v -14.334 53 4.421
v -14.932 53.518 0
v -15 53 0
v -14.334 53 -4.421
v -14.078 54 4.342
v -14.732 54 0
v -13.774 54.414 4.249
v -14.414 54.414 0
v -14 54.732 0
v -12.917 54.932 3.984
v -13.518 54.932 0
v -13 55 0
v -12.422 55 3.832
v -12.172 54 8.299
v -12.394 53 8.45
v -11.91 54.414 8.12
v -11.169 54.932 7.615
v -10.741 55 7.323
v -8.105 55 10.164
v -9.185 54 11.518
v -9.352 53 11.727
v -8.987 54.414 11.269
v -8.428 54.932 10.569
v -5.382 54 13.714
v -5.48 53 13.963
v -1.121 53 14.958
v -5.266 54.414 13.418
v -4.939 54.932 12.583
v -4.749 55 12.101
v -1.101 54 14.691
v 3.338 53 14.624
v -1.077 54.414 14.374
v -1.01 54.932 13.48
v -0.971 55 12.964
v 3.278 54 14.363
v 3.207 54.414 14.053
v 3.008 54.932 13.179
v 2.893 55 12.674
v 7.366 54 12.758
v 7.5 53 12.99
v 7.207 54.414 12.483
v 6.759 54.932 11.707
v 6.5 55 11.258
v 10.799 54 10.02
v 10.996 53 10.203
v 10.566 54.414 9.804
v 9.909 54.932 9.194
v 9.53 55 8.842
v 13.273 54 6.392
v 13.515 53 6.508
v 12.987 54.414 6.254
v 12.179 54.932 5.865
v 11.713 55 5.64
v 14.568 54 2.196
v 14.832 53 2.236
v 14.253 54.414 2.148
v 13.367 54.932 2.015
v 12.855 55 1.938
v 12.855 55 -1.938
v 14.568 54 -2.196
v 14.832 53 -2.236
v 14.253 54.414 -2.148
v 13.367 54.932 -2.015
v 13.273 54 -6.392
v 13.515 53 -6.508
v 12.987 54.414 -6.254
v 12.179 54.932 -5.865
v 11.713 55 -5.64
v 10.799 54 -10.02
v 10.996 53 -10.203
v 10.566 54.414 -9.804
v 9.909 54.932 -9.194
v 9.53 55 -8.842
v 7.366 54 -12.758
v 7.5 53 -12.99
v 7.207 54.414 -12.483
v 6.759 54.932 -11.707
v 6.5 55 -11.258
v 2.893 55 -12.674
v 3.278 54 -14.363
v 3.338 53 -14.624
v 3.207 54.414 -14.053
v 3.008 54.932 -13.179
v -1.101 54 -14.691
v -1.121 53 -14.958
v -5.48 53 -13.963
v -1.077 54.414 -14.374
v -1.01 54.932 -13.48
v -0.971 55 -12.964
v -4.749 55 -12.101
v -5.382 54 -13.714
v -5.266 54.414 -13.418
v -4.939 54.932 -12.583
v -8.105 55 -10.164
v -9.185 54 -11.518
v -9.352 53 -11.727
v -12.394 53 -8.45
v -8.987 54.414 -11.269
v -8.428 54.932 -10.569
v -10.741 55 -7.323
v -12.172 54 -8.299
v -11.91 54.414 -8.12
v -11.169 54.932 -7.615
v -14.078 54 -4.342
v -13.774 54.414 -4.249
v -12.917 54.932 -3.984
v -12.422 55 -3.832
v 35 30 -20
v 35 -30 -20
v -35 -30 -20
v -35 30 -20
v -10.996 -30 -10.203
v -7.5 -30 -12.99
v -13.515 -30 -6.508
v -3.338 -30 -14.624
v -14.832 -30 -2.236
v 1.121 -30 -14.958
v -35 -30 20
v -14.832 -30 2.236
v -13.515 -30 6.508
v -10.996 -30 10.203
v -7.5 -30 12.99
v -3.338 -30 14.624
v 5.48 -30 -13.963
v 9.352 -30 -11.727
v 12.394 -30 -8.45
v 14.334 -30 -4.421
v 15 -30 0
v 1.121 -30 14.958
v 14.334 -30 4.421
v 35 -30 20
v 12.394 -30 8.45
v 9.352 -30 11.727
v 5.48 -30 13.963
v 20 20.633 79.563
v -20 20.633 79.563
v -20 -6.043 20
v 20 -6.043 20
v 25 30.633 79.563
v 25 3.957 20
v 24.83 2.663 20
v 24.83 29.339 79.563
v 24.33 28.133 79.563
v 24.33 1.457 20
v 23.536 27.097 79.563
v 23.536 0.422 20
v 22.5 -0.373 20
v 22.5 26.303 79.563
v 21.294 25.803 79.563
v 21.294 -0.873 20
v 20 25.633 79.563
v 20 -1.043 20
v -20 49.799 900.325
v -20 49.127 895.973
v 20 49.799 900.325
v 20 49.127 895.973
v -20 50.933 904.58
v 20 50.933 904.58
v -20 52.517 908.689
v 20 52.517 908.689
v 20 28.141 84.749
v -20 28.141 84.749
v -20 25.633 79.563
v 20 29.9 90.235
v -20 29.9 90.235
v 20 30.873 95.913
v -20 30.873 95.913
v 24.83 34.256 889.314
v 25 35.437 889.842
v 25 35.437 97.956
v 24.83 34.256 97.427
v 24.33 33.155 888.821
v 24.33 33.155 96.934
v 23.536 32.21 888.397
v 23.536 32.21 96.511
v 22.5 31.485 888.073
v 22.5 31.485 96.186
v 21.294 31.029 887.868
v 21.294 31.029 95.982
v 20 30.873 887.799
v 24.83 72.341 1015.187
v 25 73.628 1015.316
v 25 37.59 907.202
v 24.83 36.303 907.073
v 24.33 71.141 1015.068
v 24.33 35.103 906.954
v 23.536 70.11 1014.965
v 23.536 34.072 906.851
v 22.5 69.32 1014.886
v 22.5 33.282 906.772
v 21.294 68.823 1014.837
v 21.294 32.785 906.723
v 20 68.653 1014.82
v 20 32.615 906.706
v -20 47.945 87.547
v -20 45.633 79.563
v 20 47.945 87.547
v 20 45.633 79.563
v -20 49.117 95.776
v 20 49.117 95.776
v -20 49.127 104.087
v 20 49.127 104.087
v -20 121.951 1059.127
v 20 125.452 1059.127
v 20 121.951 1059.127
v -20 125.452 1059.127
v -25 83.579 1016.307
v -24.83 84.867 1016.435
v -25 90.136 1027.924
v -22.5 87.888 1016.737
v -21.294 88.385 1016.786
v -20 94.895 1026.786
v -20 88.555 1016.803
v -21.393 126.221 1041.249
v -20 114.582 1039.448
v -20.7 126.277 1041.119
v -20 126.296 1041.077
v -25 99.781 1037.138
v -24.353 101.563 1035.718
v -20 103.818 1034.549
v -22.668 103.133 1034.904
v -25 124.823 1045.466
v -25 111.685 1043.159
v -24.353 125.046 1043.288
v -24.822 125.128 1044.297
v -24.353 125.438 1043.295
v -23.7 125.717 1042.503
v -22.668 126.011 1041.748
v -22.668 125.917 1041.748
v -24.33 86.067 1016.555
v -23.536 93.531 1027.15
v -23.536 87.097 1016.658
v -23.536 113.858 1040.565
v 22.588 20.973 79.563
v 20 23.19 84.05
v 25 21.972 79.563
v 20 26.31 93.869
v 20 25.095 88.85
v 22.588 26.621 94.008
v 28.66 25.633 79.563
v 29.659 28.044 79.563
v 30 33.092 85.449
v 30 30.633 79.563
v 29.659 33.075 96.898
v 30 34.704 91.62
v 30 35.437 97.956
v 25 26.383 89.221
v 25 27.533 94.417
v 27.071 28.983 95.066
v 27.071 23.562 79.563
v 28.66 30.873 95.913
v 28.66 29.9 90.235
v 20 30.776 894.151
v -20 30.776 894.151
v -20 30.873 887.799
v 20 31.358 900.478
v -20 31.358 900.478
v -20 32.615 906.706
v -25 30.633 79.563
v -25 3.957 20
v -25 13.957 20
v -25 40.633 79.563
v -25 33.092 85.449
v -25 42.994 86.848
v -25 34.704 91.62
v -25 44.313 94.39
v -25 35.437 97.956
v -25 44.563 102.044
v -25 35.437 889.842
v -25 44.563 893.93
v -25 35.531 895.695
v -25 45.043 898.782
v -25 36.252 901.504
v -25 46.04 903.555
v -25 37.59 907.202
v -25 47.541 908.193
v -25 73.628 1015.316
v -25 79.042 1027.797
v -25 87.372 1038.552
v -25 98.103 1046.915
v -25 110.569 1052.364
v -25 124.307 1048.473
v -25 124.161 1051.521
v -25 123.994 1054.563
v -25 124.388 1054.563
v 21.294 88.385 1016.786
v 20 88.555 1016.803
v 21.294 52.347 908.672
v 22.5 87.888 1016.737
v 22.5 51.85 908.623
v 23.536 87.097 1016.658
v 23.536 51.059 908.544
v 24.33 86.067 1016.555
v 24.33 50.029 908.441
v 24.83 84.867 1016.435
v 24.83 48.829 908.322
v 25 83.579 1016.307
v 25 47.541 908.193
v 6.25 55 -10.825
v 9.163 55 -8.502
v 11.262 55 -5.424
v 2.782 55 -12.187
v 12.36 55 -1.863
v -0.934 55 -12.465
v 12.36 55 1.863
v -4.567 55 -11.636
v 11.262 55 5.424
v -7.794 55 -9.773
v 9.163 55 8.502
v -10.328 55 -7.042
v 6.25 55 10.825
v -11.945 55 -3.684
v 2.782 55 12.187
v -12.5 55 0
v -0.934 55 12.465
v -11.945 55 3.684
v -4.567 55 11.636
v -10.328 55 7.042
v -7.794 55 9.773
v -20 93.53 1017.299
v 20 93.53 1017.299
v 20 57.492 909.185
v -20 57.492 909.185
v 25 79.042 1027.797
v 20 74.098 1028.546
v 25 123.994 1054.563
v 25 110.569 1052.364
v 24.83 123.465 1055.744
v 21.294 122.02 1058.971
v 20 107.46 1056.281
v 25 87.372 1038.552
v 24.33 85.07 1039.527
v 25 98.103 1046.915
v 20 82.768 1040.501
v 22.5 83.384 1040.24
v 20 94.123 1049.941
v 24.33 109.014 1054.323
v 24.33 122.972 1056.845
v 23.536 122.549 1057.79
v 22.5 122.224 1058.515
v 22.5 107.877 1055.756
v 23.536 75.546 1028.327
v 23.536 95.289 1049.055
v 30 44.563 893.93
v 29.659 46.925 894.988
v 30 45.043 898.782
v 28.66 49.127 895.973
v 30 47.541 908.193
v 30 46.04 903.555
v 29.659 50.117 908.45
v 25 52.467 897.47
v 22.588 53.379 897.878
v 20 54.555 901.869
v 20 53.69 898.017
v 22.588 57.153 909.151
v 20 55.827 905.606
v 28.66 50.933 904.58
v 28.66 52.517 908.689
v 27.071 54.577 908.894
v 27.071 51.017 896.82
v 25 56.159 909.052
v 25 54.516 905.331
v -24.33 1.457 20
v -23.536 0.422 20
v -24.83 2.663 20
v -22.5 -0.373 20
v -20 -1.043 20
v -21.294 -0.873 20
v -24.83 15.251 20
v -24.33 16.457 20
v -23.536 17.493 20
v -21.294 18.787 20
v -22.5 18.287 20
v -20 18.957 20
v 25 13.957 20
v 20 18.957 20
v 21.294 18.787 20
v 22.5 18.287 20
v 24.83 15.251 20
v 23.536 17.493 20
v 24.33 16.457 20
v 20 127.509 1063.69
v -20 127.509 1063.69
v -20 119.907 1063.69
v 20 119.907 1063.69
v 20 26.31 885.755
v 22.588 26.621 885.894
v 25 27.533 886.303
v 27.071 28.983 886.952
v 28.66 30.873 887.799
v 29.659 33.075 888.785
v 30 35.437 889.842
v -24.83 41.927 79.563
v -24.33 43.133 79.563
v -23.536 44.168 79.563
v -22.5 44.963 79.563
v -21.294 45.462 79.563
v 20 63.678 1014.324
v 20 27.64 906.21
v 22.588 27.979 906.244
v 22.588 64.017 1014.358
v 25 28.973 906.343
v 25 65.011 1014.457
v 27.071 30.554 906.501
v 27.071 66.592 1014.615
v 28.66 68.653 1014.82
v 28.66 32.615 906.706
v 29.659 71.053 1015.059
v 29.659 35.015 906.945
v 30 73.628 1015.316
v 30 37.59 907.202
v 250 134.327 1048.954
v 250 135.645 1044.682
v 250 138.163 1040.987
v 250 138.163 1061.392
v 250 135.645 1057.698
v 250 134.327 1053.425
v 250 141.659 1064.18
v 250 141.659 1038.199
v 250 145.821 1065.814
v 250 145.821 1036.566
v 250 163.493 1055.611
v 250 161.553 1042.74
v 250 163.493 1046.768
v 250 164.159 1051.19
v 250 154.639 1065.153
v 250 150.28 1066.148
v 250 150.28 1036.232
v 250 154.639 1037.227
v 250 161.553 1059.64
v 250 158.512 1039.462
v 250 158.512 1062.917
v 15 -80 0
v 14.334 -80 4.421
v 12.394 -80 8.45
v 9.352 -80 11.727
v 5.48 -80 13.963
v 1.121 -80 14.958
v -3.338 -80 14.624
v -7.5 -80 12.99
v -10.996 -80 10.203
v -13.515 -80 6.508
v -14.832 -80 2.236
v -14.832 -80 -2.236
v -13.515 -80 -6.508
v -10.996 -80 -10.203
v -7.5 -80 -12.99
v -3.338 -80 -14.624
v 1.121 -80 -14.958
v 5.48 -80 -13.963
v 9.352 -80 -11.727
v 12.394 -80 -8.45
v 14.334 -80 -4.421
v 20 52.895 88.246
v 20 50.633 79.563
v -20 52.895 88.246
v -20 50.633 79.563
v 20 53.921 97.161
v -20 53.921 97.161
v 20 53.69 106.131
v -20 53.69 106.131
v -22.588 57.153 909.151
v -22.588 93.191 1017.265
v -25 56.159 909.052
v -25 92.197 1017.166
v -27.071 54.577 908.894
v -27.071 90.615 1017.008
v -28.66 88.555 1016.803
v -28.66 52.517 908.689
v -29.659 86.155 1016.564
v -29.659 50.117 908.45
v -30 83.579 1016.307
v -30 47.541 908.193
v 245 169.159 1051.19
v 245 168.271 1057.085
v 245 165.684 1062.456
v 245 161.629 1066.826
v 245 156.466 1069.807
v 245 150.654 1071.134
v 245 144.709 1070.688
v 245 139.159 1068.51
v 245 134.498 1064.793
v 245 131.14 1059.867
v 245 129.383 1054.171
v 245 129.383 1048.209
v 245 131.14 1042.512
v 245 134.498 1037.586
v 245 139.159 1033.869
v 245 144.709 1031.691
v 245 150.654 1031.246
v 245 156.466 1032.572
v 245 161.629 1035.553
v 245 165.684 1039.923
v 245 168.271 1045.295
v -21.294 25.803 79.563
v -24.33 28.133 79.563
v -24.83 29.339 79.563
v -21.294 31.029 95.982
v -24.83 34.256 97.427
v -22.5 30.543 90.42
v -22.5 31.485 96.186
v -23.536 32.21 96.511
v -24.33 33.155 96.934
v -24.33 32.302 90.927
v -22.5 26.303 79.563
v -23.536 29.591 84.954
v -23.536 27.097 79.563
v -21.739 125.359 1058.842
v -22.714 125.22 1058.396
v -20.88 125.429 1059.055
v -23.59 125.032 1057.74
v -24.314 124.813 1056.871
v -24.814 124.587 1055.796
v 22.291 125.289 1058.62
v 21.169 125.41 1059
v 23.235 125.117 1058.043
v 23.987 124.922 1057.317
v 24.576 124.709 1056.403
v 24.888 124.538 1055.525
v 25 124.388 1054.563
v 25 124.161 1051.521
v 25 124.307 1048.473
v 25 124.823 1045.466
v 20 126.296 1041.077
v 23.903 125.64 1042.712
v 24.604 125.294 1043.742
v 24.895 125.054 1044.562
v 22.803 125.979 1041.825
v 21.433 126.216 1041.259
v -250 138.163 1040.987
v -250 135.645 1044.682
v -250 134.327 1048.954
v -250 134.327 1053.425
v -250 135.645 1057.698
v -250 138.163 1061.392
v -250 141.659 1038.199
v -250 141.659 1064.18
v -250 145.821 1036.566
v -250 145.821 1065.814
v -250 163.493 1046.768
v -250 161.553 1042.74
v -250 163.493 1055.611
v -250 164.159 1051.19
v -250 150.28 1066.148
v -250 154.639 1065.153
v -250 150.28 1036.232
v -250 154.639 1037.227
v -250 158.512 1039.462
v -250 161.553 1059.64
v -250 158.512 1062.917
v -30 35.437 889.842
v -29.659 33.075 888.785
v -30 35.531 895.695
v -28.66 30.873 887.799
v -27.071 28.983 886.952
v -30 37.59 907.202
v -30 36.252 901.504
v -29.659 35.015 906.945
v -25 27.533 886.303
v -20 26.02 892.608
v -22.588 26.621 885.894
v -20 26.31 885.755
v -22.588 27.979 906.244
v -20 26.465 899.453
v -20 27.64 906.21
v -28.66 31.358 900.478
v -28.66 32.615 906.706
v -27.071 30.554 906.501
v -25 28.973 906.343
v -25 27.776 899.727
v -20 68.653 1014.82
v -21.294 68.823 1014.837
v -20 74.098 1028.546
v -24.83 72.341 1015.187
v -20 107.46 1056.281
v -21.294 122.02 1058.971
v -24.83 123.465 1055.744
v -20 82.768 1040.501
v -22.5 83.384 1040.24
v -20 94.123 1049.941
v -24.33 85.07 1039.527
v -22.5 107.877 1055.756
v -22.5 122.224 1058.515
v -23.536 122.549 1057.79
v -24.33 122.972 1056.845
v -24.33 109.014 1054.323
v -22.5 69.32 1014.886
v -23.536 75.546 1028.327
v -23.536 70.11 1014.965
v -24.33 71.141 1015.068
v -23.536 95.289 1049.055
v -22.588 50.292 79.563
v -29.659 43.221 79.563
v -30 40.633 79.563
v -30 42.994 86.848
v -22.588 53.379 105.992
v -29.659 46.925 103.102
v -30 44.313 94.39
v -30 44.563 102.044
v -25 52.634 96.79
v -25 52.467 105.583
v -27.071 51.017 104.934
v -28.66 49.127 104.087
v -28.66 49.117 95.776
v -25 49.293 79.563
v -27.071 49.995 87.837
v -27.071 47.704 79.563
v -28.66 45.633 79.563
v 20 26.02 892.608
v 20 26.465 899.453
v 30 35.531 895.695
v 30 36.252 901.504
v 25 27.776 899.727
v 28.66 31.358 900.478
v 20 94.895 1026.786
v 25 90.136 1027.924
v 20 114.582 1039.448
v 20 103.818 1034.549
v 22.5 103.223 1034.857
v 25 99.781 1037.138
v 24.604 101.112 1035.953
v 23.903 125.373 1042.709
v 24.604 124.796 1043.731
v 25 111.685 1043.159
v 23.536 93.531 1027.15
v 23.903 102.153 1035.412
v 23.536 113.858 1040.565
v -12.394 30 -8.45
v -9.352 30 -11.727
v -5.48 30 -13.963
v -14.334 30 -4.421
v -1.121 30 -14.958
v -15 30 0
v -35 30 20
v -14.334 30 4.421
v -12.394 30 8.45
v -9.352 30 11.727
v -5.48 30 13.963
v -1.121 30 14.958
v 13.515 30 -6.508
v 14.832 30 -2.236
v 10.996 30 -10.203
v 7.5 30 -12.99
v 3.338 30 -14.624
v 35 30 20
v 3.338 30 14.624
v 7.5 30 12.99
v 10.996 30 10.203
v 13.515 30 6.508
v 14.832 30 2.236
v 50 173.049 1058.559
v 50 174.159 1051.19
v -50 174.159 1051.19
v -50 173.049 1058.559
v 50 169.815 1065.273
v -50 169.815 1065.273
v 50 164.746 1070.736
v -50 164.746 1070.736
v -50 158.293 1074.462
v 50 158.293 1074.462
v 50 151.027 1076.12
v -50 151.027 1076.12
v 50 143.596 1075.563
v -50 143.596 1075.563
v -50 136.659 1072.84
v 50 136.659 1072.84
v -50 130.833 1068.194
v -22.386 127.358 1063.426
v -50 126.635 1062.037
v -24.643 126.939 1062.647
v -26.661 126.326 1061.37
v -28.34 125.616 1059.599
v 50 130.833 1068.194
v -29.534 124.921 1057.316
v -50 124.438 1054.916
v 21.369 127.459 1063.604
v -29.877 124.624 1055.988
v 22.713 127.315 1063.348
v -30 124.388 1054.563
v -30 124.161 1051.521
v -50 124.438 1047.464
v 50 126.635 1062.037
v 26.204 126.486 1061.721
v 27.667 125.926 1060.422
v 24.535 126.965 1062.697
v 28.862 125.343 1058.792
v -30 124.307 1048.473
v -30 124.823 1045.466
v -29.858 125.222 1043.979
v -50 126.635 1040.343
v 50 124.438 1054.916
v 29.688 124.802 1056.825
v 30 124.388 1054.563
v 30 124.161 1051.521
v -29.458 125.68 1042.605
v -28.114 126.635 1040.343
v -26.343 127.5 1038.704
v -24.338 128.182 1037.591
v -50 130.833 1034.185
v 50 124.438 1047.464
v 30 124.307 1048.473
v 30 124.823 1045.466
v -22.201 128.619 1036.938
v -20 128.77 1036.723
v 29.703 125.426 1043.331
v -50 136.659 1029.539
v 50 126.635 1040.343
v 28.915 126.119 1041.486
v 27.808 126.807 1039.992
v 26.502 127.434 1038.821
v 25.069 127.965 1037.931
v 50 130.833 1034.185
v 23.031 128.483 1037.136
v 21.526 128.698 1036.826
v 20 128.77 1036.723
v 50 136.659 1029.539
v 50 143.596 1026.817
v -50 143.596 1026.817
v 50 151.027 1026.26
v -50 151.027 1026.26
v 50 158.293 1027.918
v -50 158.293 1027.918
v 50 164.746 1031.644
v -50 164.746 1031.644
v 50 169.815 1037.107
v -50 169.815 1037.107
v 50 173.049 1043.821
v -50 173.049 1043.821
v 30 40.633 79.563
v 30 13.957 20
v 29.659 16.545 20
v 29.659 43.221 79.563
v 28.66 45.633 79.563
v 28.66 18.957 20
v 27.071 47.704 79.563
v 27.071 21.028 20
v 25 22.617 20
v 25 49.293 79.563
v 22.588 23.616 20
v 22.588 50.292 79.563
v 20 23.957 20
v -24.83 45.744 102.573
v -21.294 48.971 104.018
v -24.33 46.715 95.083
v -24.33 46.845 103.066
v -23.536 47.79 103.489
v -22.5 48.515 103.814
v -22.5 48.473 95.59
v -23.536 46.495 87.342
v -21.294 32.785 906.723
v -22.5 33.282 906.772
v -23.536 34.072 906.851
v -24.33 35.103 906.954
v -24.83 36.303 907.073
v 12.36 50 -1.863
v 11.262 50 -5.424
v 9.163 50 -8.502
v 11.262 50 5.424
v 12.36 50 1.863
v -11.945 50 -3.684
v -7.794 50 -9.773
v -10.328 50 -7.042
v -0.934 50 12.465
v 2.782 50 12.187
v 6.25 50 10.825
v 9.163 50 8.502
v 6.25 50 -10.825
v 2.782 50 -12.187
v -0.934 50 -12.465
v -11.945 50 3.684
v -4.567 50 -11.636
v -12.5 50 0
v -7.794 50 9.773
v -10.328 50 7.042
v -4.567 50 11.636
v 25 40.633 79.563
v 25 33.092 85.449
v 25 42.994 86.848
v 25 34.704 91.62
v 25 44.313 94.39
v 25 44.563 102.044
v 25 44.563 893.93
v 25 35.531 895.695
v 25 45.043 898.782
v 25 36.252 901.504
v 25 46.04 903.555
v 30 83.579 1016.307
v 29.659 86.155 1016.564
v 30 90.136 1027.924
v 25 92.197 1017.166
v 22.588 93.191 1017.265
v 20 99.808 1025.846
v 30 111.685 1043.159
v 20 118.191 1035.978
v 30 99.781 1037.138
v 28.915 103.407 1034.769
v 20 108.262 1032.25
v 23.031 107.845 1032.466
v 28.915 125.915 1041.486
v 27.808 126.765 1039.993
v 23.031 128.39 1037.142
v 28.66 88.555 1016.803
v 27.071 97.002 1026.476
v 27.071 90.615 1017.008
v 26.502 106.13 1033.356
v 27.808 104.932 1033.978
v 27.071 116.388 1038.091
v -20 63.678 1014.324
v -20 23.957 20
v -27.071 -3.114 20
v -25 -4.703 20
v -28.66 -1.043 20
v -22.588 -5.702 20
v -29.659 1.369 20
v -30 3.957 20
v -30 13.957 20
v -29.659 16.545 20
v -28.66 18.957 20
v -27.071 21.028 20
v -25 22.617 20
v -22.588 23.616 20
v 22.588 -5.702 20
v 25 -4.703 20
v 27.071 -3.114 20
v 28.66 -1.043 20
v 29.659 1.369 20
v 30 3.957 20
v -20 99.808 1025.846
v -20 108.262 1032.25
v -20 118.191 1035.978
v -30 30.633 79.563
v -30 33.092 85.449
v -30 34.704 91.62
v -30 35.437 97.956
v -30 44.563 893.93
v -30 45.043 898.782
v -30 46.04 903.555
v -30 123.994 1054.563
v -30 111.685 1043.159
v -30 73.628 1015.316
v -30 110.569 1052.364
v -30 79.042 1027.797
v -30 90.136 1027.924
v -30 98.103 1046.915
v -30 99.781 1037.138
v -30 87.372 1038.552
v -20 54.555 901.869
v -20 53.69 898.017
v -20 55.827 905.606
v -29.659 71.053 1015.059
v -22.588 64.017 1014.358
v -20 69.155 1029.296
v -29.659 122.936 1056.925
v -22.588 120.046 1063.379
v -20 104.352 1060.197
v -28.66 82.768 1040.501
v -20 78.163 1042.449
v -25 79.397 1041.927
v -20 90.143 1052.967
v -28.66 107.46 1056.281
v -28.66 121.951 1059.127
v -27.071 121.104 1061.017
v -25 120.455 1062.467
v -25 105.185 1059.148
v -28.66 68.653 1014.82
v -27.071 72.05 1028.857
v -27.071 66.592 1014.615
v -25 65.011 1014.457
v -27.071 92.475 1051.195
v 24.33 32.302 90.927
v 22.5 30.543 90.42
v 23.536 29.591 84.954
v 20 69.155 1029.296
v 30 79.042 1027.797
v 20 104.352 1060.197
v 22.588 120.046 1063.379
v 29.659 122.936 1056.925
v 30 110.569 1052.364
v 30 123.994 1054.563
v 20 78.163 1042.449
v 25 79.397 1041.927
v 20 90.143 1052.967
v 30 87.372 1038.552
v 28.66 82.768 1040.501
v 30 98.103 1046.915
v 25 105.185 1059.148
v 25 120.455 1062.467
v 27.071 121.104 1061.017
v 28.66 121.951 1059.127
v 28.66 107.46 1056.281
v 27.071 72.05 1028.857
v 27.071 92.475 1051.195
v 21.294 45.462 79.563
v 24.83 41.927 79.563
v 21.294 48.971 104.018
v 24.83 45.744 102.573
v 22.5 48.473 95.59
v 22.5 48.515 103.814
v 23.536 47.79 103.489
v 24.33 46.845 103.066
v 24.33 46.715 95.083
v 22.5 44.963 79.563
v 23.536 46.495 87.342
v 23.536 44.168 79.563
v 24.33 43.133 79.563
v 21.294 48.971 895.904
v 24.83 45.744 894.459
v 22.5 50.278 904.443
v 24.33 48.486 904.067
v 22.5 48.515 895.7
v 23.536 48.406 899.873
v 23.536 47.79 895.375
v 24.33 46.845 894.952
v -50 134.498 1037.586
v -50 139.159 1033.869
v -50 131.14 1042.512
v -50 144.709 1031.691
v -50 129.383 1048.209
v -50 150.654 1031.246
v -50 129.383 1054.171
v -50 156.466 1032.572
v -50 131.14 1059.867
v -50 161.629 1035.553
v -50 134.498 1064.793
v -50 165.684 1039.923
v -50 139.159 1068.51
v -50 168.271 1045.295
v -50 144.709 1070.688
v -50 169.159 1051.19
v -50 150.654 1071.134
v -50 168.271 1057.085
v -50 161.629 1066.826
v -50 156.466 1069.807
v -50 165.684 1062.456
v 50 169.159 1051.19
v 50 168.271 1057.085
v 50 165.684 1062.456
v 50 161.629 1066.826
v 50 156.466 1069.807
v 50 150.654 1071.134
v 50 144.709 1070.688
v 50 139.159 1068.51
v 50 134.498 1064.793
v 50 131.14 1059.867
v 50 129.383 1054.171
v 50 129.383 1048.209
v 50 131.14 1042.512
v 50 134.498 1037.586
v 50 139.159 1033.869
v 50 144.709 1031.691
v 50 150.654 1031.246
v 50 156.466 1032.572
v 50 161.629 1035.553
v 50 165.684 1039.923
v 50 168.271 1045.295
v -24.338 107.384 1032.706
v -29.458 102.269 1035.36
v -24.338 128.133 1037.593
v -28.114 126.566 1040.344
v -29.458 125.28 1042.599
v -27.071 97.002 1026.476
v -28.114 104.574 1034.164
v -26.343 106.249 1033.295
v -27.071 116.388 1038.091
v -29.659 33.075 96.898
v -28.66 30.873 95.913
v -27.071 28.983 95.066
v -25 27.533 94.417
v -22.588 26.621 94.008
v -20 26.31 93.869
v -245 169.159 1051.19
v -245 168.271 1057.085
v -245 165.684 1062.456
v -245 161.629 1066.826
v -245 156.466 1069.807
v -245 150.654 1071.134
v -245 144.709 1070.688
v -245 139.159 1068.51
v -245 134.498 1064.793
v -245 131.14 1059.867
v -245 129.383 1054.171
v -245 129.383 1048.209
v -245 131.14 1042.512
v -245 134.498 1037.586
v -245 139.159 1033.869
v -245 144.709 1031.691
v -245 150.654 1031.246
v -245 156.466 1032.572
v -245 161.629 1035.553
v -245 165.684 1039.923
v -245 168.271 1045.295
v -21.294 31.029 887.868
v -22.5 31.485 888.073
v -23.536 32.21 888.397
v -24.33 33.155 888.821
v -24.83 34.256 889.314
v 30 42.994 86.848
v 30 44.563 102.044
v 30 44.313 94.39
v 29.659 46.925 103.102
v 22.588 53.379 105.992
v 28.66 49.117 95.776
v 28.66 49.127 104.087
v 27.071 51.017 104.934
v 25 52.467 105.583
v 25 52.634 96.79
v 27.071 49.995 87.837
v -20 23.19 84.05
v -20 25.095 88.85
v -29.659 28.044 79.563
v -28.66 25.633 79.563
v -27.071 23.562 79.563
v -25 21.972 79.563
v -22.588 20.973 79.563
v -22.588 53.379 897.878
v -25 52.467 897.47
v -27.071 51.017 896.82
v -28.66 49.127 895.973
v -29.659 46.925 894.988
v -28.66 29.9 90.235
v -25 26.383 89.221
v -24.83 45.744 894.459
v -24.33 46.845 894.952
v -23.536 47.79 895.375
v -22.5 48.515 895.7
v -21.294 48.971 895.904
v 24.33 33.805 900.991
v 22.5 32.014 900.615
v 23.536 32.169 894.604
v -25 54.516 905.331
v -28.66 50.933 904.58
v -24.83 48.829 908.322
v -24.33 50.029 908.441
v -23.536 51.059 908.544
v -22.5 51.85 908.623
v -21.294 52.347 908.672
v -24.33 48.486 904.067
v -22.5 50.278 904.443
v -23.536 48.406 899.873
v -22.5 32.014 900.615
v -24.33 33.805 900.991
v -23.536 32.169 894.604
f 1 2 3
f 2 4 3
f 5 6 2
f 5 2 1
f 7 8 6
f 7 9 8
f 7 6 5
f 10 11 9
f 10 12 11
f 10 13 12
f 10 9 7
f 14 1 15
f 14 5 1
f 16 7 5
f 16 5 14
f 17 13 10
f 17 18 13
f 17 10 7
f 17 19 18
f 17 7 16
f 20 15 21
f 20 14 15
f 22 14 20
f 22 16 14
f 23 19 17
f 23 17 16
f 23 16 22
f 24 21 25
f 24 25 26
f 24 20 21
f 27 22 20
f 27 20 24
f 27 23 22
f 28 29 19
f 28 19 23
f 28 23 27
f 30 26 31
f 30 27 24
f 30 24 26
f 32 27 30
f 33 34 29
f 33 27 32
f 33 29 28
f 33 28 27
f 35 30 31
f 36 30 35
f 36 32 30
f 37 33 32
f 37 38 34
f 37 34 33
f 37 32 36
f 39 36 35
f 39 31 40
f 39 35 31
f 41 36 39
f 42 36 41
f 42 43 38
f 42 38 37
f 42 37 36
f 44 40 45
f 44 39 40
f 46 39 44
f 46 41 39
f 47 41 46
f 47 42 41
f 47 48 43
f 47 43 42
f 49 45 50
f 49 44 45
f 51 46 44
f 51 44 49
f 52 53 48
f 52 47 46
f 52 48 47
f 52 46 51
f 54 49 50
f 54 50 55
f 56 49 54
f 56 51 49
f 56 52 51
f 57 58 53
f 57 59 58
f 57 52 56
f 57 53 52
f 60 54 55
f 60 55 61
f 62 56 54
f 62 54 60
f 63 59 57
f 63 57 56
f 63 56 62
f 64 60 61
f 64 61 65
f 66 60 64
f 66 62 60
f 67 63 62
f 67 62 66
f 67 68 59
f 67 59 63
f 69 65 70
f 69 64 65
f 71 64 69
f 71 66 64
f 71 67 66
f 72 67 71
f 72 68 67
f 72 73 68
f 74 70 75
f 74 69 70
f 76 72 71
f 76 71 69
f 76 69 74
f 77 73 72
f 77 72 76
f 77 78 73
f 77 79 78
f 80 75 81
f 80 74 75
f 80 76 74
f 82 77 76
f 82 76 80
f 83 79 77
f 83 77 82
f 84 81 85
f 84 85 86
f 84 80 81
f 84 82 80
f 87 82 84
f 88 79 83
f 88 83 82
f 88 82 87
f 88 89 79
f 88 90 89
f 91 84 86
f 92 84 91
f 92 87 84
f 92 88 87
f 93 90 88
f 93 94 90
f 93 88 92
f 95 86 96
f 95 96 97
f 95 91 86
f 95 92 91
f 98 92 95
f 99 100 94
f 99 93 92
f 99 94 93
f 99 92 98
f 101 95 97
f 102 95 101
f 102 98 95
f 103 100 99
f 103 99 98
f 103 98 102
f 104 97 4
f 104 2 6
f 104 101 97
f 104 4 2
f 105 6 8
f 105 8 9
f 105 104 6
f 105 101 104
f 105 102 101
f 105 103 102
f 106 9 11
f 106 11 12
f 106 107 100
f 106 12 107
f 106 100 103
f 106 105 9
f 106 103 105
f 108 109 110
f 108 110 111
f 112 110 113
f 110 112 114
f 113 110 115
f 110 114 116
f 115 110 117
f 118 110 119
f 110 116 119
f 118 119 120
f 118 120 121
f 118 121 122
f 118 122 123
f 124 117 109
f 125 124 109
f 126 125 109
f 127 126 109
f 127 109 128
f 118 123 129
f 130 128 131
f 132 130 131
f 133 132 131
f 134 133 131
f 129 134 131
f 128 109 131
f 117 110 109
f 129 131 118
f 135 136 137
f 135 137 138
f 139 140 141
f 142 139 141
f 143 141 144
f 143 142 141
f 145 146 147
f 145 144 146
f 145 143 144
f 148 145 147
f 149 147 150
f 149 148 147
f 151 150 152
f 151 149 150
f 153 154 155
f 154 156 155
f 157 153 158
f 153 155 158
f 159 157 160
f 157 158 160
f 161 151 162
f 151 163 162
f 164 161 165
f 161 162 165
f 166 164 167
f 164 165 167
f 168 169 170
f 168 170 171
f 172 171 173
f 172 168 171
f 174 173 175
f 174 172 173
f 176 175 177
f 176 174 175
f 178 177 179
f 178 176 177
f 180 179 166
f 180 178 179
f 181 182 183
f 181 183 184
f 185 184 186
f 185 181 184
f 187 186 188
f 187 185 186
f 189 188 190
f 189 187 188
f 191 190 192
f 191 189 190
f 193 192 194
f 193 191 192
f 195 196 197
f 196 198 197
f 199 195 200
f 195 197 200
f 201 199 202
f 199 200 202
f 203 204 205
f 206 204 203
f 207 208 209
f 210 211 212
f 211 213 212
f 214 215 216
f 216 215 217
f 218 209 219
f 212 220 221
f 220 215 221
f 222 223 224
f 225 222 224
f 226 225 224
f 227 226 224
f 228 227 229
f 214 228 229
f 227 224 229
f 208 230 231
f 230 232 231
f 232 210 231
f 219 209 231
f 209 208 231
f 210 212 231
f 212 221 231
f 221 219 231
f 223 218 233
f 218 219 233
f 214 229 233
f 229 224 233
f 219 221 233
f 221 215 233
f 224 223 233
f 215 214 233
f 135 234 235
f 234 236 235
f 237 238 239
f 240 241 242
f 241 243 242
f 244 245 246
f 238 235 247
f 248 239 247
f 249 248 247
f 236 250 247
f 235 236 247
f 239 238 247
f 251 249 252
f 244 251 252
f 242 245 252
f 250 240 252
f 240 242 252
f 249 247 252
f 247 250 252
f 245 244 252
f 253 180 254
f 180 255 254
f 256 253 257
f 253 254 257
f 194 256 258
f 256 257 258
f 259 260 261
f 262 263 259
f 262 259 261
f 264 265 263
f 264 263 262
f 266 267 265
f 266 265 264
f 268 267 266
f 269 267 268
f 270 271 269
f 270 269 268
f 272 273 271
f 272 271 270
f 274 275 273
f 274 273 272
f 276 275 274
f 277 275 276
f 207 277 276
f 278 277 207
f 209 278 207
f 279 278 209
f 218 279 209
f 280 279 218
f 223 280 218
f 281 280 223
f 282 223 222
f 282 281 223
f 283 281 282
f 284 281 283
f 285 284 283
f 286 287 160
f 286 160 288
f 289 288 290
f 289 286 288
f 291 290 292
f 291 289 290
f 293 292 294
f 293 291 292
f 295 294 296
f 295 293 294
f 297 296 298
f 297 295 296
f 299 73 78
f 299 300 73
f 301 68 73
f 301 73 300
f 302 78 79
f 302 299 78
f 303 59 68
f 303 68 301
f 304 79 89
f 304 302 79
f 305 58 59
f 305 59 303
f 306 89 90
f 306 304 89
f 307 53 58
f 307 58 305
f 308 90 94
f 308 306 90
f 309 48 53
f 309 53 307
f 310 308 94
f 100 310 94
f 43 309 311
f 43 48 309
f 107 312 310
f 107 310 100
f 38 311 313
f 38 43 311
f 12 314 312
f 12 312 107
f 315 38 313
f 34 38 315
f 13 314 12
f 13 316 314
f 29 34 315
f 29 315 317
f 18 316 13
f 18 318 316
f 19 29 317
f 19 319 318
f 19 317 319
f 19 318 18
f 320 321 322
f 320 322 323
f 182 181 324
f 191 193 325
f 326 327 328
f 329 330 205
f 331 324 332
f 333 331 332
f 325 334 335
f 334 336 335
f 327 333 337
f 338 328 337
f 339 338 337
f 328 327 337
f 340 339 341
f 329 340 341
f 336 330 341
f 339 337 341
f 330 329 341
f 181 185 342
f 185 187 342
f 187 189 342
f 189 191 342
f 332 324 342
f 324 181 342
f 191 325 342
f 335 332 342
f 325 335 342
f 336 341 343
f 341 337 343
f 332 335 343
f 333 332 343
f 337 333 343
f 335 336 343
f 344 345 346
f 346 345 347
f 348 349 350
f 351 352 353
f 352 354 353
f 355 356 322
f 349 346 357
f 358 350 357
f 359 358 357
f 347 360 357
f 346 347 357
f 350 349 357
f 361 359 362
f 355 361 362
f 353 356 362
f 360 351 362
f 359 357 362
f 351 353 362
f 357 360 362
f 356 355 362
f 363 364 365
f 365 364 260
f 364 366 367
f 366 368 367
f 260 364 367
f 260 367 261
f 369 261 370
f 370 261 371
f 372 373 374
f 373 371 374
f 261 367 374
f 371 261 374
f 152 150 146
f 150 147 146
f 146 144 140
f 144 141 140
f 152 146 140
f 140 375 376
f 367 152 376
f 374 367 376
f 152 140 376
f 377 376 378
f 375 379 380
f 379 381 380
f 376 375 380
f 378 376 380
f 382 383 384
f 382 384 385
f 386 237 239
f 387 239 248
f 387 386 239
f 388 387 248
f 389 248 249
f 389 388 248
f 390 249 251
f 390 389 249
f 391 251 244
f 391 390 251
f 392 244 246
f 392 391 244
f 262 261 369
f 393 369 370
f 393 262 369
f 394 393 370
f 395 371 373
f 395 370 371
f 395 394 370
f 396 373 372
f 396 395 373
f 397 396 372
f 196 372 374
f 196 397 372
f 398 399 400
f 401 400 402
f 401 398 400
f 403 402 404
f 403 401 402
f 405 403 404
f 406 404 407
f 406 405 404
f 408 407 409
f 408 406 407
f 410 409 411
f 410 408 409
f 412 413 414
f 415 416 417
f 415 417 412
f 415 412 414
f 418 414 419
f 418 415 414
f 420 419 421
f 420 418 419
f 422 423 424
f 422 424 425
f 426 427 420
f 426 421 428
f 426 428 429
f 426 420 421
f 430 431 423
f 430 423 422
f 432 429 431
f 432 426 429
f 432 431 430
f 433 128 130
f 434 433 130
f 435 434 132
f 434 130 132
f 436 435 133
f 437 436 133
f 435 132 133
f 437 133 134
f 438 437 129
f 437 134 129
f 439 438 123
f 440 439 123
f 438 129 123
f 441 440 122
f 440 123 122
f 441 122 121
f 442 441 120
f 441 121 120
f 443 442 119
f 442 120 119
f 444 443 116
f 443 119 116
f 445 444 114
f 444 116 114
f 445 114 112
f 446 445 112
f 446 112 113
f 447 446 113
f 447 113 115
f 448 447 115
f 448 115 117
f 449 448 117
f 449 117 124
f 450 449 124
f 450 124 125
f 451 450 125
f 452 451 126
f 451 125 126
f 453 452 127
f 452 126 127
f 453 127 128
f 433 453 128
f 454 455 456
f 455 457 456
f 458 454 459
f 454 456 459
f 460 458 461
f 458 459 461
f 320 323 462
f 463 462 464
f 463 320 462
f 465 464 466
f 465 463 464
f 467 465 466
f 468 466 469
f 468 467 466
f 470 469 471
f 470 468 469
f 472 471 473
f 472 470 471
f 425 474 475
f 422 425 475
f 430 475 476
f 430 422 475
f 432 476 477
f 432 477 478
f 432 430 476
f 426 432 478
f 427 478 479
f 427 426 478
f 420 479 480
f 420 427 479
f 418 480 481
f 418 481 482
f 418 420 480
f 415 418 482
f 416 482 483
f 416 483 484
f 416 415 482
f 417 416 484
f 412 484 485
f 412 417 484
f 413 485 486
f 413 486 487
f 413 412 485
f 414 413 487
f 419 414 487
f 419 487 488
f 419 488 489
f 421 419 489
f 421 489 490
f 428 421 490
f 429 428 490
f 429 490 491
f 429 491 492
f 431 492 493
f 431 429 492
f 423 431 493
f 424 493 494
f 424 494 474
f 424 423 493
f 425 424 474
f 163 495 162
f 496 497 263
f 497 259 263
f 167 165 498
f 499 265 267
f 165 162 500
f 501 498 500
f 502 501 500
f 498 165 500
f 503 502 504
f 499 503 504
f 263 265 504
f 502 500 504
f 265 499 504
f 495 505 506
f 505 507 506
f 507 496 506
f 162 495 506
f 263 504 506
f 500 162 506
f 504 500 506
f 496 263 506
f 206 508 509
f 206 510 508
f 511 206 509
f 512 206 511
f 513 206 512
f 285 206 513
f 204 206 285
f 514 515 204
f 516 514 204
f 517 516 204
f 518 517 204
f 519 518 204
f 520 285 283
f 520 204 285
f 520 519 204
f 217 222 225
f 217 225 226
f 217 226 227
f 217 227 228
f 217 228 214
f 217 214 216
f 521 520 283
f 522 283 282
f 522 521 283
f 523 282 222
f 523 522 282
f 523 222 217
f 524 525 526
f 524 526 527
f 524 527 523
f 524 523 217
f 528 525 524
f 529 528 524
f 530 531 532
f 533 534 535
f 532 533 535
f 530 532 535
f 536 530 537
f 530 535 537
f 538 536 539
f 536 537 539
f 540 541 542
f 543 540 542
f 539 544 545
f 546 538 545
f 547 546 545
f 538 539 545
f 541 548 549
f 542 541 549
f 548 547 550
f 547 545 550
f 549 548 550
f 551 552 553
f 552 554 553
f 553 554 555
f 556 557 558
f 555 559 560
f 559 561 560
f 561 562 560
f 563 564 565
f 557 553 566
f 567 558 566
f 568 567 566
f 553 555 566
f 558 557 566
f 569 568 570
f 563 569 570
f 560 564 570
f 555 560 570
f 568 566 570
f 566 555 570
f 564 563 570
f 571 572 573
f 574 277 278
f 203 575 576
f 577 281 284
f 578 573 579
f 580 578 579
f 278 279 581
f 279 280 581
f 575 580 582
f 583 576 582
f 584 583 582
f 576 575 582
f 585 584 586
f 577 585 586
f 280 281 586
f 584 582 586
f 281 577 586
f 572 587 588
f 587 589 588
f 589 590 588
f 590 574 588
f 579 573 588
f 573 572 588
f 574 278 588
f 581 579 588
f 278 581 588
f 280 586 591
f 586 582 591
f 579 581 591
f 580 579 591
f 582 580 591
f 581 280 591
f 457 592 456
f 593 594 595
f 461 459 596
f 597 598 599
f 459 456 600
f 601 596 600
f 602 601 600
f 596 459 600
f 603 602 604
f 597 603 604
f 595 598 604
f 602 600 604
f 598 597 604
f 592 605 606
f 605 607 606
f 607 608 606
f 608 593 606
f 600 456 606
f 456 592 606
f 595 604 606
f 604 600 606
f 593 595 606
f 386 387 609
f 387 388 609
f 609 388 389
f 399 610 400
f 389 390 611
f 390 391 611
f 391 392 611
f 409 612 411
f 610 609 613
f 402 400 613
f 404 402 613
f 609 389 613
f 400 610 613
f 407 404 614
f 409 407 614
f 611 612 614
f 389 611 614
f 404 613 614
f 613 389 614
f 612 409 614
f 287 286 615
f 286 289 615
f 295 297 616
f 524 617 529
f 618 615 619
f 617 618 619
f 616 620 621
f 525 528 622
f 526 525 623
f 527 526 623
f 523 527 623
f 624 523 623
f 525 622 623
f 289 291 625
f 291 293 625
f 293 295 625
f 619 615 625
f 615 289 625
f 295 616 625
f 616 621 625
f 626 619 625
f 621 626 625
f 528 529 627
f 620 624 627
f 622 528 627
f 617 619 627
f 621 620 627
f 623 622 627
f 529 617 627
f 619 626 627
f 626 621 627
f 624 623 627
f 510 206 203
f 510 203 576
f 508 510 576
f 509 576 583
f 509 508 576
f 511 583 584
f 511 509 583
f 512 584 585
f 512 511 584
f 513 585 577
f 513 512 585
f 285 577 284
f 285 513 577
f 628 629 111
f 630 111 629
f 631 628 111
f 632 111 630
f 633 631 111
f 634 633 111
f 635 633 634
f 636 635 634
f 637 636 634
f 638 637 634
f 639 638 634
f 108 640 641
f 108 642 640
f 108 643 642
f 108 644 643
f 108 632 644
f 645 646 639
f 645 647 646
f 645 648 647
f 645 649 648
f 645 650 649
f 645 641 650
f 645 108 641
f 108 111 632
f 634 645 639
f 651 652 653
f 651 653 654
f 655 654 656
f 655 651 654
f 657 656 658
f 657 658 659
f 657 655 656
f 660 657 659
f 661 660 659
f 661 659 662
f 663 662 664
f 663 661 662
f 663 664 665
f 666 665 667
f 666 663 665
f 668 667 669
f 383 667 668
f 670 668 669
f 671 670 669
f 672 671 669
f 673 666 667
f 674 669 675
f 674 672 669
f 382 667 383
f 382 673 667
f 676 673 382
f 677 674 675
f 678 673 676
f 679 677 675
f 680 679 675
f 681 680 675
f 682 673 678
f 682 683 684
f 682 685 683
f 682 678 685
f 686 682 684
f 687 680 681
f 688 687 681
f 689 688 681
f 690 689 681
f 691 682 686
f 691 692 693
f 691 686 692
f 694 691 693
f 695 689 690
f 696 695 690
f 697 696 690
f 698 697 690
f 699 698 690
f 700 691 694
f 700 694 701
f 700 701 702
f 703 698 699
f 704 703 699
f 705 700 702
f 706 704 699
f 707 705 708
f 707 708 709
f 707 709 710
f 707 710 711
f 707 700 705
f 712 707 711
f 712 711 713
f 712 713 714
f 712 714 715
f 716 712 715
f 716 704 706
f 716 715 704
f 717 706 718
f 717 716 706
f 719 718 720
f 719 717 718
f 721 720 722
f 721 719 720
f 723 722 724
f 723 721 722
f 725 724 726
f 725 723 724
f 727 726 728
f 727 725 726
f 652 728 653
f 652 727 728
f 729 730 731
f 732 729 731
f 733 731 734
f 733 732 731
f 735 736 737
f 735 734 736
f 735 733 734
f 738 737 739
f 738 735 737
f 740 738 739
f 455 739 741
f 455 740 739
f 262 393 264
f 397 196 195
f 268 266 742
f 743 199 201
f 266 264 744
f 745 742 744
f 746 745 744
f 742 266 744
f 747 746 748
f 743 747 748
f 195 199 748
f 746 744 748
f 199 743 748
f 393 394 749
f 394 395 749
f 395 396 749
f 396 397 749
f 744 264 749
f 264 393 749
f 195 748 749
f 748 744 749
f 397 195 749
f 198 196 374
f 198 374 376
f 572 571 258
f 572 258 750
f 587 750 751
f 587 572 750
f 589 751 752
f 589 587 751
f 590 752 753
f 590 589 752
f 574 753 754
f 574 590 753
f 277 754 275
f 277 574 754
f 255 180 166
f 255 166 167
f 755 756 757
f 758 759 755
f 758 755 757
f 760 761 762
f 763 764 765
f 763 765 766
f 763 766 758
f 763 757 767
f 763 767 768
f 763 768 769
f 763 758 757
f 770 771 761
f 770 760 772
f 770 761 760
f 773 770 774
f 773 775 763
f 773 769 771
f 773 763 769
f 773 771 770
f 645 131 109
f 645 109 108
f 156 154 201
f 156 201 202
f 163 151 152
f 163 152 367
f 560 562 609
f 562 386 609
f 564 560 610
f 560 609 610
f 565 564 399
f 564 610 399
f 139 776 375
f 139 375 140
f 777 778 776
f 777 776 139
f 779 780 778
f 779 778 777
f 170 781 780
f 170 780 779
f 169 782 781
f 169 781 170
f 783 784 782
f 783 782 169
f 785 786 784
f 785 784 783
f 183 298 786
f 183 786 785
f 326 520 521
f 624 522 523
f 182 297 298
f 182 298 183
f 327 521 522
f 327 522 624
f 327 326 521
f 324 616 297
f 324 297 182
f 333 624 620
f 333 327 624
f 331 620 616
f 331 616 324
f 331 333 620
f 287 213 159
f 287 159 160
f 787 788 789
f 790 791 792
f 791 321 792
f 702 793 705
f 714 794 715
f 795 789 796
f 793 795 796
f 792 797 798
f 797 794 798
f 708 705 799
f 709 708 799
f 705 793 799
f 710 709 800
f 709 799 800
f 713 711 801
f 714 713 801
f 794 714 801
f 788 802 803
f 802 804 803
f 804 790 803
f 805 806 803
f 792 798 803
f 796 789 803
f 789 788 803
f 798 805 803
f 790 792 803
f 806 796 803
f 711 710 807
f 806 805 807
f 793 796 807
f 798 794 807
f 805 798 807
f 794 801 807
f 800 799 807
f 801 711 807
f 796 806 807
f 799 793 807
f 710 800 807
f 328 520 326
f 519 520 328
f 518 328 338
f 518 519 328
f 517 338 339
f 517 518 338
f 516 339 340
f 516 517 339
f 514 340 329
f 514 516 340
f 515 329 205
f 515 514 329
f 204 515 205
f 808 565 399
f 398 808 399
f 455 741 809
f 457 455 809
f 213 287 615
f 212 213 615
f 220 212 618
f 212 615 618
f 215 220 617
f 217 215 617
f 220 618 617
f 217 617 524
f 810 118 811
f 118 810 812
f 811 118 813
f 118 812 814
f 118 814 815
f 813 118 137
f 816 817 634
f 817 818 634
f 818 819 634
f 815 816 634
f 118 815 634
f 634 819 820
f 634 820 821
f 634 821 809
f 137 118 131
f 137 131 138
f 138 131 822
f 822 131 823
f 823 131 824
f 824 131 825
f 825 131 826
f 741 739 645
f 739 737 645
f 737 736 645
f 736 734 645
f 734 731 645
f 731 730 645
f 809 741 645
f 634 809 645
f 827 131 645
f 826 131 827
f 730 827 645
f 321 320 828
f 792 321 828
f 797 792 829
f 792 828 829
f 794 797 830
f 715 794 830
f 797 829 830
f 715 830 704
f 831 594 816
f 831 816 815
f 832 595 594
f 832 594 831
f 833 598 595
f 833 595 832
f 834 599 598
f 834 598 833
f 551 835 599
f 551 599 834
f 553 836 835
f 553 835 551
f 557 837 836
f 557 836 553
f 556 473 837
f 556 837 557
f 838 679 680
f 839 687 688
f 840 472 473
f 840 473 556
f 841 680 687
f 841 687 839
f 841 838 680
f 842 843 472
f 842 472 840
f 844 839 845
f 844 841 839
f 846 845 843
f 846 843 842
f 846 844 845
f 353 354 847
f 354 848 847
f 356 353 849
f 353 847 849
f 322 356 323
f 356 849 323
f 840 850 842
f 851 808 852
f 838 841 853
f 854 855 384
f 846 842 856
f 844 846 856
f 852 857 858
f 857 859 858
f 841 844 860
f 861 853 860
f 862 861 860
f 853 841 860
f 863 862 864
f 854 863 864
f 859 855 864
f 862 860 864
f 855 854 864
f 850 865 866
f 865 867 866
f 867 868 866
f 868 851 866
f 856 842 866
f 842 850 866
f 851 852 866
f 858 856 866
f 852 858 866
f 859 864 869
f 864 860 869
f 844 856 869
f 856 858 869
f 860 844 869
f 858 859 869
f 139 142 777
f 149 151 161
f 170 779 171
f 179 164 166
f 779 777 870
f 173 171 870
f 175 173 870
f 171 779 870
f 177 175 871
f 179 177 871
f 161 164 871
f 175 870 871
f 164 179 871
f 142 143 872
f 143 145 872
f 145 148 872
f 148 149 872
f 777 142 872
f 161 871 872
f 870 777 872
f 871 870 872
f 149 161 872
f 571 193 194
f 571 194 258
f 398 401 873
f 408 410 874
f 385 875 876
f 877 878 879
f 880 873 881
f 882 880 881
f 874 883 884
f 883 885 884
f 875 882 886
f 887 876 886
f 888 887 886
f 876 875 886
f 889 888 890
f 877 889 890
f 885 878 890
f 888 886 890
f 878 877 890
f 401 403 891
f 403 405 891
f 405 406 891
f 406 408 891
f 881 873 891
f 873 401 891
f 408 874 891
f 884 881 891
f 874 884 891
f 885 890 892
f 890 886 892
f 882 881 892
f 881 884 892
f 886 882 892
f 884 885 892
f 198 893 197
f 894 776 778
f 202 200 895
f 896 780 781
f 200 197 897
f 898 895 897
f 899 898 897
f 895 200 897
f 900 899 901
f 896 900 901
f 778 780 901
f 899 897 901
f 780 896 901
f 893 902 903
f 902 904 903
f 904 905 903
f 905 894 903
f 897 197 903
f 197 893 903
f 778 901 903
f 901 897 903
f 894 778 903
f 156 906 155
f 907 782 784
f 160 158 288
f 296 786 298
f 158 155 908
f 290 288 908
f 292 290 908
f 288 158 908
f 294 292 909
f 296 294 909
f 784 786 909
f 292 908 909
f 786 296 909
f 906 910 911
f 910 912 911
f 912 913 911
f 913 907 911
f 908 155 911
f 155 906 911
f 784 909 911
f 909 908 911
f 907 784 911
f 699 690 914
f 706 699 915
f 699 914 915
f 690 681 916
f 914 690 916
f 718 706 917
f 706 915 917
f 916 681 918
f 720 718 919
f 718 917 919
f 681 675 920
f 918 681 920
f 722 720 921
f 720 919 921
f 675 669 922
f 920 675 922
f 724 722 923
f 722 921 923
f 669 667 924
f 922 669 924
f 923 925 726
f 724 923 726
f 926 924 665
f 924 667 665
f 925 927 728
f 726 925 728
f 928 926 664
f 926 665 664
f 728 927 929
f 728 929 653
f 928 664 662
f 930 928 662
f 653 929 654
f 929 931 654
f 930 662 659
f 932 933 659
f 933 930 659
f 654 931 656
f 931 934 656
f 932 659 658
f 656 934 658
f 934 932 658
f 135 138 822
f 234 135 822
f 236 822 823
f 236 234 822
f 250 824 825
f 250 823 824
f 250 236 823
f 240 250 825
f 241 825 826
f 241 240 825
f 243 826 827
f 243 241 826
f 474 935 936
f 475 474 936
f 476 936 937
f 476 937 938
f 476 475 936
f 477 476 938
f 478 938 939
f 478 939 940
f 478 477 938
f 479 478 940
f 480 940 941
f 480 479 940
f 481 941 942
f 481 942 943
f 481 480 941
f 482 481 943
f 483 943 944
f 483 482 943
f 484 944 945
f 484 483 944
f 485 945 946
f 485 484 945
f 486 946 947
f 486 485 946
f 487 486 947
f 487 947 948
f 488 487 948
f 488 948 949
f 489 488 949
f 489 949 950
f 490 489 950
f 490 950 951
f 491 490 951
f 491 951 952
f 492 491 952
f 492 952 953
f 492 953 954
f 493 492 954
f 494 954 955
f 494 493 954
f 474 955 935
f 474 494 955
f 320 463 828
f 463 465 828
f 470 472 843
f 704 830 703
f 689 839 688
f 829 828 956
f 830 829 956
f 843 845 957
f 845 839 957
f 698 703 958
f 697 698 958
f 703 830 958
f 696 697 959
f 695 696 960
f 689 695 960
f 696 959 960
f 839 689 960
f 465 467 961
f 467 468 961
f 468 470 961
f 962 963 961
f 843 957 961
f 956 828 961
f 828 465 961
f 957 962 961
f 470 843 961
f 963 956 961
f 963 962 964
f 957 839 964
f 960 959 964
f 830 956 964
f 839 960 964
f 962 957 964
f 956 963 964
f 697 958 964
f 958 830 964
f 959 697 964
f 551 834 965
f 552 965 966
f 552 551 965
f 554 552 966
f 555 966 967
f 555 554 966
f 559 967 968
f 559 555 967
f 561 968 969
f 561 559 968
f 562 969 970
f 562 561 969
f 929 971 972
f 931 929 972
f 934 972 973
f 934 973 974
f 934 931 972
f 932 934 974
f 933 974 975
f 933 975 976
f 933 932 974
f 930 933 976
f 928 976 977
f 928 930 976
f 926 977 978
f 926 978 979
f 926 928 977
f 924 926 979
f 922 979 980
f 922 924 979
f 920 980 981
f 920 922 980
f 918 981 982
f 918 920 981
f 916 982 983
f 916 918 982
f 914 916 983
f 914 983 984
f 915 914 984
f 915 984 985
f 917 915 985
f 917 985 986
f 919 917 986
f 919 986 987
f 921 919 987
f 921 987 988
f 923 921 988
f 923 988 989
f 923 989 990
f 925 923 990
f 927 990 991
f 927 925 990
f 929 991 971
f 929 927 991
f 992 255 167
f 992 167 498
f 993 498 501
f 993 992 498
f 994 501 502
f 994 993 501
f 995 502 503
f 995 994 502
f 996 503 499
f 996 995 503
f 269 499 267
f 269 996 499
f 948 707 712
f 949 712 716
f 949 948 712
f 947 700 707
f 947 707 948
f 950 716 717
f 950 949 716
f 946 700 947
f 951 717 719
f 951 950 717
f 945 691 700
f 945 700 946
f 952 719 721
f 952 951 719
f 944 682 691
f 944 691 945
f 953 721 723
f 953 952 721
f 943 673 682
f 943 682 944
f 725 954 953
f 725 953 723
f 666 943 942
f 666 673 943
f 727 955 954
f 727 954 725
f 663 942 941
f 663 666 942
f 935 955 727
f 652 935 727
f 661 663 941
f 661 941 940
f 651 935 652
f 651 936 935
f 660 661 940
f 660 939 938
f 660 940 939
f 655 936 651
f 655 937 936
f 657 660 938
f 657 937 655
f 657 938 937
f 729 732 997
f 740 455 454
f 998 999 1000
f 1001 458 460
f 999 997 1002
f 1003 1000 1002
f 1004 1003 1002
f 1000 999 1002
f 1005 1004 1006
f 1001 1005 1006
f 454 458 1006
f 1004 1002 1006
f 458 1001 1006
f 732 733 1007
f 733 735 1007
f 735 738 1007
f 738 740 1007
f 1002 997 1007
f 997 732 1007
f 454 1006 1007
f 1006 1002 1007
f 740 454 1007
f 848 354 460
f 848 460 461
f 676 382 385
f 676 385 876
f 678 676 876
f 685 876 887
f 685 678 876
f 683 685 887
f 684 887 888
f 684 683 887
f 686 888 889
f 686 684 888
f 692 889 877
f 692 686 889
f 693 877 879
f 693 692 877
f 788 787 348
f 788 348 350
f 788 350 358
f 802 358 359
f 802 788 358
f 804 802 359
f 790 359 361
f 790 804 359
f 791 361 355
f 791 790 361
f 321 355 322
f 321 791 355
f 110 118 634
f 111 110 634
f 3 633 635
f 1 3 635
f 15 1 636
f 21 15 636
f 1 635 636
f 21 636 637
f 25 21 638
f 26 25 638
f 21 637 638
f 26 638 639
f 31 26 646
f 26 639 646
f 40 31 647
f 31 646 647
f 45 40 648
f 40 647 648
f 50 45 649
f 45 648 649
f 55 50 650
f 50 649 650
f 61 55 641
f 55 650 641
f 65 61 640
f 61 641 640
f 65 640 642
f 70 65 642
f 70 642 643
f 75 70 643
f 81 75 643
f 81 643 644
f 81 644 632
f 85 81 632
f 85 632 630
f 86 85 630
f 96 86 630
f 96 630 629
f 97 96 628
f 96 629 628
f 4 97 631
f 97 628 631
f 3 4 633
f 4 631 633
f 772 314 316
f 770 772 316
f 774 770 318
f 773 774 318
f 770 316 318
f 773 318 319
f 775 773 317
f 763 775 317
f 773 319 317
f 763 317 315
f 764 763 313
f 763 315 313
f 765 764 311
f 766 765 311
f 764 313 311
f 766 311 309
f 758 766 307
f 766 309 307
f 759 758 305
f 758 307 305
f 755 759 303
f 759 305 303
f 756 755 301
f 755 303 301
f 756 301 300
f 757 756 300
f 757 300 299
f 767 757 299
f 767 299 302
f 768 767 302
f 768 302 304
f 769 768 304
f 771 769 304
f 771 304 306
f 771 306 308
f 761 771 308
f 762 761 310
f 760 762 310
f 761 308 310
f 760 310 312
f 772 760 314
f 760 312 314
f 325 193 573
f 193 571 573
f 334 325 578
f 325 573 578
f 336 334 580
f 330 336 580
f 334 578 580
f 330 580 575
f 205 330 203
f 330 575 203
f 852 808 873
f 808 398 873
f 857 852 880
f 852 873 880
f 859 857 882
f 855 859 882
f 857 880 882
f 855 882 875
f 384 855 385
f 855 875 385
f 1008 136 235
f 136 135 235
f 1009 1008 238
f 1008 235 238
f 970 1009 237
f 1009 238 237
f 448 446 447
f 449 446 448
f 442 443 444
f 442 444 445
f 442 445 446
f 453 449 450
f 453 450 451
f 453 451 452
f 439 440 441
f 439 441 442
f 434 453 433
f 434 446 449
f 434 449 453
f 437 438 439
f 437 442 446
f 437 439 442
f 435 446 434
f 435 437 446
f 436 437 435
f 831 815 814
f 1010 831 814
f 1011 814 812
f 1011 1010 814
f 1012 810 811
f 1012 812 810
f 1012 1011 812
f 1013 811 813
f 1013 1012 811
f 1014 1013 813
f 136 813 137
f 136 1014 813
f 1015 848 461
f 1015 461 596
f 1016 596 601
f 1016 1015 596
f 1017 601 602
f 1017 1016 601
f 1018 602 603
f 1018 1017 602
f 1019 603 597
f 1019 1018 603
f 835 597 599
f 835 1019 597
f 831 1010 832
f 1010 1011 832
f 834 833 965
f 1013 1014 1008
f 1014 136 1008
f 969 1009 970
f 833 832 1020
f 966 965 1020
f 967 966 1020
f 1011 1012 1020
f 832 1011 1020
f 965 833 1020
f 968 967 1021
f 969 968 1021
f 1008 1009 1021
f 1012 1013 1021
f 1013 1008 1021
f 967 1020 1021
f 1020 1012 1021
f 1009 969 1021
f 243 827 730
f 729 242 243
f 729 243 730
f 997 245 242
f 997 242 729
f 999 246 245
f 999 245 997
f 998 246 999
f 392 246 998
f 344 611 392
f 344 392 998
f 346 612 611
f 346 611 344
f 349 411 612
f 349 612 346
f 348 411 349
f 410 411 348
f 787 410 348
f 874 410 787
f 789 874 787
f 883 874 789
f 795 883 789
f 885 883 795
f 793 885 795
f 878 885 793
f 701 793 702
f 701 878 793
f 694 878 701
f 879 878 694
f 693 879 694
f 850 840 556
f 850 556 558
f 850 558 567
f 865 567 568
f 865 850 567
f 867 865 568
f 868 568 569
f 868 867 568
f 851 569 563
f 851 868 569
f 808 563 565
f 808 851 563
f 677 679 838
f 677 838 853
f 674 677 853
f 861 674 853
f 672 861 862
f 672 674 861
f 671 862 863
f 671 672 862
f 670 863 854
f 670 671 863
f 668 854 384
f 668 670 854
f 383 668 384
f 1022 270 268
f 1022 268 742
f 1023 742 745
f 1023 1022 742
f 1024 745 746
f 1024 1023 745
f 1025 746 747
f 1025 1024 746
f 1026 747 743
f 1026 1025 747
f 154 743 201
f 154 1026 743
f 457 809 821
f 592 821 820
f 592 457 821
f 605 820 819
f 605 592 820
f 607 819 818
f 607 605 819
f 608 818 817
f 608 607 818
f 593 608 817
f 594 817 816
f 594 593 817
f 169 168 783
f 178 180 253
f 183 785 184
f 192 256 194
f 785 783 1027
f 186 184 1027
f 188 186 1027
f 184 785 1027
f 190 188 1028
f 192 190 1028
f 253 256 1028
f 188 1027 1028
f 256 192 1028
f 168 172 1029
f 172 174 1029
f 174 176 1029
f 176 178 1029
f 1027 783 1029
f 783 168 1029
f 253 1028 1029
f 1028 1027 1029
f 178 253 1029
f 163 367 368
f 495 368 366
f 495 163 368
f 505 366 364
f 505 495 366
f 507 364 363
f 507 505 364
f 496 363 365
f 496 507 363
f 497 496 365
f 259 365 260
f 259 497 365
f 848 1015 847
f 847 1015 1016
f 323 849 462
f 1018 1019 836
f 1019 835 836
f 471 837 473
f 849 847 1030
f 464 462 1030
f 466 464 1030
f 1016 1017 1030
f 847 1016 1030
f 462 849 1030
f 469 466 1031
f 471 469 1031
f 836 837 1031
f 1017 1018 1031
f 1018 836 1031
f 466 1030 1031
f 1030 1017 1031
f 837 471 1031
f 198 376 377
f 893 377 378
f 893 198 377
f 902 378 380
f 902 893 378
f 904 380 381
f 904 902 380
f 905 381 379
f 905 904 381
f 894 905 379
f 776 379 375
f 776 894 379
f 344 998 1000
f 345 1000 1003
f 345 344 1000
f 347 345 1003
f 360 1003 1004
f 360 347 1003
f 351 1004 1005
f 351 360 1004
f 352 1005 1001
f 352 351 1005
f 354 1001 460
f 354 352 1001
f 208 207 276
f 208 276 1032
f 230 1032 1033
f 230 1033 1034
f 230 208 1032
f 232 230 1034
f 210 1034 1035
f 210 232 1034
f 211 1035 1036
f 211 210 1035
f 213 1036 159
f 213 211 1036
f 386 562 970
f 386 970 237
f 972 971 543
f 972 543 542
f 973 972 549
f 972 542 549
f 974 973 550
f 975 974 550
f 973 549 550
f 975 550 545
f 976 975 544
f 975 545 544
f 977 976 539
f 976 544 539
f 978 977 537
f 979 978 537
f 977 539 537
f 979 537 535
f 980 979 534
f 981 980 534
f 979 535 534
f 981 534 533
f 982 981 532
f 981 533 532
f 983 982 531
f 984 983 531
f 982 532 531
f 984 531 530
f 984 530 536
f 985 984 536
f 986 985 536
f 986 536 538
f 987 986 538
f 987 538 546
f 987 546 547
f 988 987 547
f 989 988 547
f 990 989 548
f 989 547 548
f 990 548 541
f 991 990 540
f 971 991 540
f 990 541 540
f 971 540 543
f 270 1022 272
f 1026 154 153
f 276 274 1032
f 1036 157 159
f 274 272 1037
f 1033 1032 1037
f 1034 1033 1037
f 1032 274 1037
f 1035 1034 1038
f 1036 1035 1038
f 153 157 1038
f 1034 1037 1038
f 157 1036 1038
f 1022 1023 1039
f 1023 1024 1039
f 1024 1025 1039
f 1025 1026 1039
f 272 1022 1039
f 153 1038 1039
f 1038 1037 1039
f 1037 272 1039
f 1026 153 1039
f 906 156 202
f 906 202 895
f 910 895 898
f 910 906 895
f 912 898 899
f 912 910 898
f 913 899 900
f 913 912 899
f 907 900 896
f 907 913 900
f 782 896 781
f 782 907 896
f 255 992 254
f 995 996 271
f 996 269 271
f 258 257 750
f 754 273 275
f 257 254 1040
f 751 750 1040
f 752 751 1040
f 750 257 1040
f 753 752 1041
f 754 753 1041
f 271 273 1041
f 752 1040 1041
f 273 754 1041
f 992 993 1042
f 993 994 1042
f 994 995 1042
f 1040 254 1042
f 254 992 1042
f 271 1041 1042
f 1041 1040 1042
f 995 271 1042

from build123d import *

# Parameters (mm, degrees)
F3_R      = 25
F4_DEPTH  = 50
F5_R      = 20
F6_DEPTH  = 250
F7_SIZE   = 5
F8_W      = 60
F8_H      = 40
F9_DEPTH  = 35
F10_R     = 15
F11_DEPTH = 25
F12_R     = 15
F13_DEPTH = 50
F14_R     = 12.5
F15_DEPTH = 5
F16_R     = 2


with BuildPart() as f2:
    # F2: sweep along a path in F1
    with BuildLine(Plane.YZ) as f2_path:
        Line((0, 0), (35.6326628073, 79.5632662807))
        ThreePointArc((35.6326628073, 79.5632662807), (38.8959770348, 89.5509124888), (40, 100))
        Line((40, 100), (40, 500))
        Line((40, 500), (40, 891.8861169916))
        ThreePointArc((40, 891.8861169916), (40.6456271181, 899.8952291419), (42.5658350975, 907.6975052924))
        Line((42.5658350975, 907.6975052924), (78.6037961003, 1015.8113883008))
        ThreePointArc((78.6037961003, 1015.8113883008), (96.8024467696, 1040.5621092588), (126.0379610028, 1050))
        Line((126.0379610028, 1050), (150, 1050))
    # F0 (on Top) → F2 (sweep)
    with BuildSketch(Plane.XY):
        with BuildLine():
            Line((-20, -15), (20, -15))
            ThreePointArc((20, -15), (27.0710678119, -12.0710678119), (30, -5))
            Line((30, -5), (30, 5))
            ThreePointArc((30, 5), (27.0710678119, 12.0710678119), (20, 15))
            Line((20, 15), (-20, 15))
            ThreePointArc((-20, 15), (-27.0710678119, 12.0710678119), (-30, 5))
            Line((-30, 5), (-30, -5))
            ThreePointArc((-30, -5), (-27.0710678119, -12.0710678119), (-20, -15))
        make_face()
        with BuildLine():
            Line((-20, 10), (20, 10))
            ThreePointArc((20, 10), (23.5355339059, 8.5355339059), (25, 5))
            Line((25, 5), (25, -5))
            ThreePointArc((25, -5), (23.5355339059, -8.5355339059), (20, -10))
            Line((20, -10), (-20, -10))
            ThreePointArc((-20, -10), (-23.5355339059, -8.5355339059), (-25, -5))
            Line((-25, -5), (-25, 5))
            ThreePointArc((-25, 5), (-23.5355339059, 8.5355339059), (-20, 10))
        make_face(mode=Mode.SUBTRACT)
    sweep(path=f2_path.line)

    # F3 (on Right) → F4 (join, symmetric)
    with BuildSketch(Plane.YZ):
        with Locations((149.1591930389, 1051.1897988422)):
            Circle(F3_R)
    extrude(amount=F4_DEPTH, both=True)

    # F5 (on Right) → F6 (join, symmetric)
    with BuildSketch(Plane.YZ):
        with Locations((149.1591930389, 1051.1897988422)):
            Circle(F5_R)
    extrude(amount=F6_DEPTH, both=True)

    # F7
    f7_edges = [f2.edges().sort_by_distance(p)[0] for p in [
        (-250, 129.159193, 1051.189799),
        (250, 129.159193, 1051.189799),
    ]]
    chamfer(f7_edges, length=F7_SIZE)

    # F8 (on Right) → F9 (join, symmetric)
    with BuildSketch(Plane.YZ):
        Rectangle(F8_W, F8_H)
    extrude(amount=F9_DEPTH, both=True)

    # F10 (on face) → F11 (join)
    with BuildSketch(Plane(origin=(0, 30, 0), x_dir=(-1, 0, 0), z_dir=(0, 1, 0))):
        Circle(F10_R)
    extrude(amount=F11_DEPTH)

    # F12 (on face) → F13 (join)
    with BuildSketch(Plane.XZ.offset(30)):
        Circle(F12_R)
    extrude(amount=F13_DEPTH)

    # F14 (on face) → F15 (cut)
    with BuildSketch(Plane(origin=(0, 55, 0), x_dir=(-1, 0, 0), z_dir=(0, 1, 0))):
        Circle(F14_R)
    extrude(amount=-F15_DEPTH, mode=Mode.SUBTRACT)

    # F16
    f16_edges = [f2.edges().sort_by_distance(p)[0] for p in [
        (15, 55, 0),
    ]]
    fillet(f16_edges, radius=F16_R)


solid = f2.part
